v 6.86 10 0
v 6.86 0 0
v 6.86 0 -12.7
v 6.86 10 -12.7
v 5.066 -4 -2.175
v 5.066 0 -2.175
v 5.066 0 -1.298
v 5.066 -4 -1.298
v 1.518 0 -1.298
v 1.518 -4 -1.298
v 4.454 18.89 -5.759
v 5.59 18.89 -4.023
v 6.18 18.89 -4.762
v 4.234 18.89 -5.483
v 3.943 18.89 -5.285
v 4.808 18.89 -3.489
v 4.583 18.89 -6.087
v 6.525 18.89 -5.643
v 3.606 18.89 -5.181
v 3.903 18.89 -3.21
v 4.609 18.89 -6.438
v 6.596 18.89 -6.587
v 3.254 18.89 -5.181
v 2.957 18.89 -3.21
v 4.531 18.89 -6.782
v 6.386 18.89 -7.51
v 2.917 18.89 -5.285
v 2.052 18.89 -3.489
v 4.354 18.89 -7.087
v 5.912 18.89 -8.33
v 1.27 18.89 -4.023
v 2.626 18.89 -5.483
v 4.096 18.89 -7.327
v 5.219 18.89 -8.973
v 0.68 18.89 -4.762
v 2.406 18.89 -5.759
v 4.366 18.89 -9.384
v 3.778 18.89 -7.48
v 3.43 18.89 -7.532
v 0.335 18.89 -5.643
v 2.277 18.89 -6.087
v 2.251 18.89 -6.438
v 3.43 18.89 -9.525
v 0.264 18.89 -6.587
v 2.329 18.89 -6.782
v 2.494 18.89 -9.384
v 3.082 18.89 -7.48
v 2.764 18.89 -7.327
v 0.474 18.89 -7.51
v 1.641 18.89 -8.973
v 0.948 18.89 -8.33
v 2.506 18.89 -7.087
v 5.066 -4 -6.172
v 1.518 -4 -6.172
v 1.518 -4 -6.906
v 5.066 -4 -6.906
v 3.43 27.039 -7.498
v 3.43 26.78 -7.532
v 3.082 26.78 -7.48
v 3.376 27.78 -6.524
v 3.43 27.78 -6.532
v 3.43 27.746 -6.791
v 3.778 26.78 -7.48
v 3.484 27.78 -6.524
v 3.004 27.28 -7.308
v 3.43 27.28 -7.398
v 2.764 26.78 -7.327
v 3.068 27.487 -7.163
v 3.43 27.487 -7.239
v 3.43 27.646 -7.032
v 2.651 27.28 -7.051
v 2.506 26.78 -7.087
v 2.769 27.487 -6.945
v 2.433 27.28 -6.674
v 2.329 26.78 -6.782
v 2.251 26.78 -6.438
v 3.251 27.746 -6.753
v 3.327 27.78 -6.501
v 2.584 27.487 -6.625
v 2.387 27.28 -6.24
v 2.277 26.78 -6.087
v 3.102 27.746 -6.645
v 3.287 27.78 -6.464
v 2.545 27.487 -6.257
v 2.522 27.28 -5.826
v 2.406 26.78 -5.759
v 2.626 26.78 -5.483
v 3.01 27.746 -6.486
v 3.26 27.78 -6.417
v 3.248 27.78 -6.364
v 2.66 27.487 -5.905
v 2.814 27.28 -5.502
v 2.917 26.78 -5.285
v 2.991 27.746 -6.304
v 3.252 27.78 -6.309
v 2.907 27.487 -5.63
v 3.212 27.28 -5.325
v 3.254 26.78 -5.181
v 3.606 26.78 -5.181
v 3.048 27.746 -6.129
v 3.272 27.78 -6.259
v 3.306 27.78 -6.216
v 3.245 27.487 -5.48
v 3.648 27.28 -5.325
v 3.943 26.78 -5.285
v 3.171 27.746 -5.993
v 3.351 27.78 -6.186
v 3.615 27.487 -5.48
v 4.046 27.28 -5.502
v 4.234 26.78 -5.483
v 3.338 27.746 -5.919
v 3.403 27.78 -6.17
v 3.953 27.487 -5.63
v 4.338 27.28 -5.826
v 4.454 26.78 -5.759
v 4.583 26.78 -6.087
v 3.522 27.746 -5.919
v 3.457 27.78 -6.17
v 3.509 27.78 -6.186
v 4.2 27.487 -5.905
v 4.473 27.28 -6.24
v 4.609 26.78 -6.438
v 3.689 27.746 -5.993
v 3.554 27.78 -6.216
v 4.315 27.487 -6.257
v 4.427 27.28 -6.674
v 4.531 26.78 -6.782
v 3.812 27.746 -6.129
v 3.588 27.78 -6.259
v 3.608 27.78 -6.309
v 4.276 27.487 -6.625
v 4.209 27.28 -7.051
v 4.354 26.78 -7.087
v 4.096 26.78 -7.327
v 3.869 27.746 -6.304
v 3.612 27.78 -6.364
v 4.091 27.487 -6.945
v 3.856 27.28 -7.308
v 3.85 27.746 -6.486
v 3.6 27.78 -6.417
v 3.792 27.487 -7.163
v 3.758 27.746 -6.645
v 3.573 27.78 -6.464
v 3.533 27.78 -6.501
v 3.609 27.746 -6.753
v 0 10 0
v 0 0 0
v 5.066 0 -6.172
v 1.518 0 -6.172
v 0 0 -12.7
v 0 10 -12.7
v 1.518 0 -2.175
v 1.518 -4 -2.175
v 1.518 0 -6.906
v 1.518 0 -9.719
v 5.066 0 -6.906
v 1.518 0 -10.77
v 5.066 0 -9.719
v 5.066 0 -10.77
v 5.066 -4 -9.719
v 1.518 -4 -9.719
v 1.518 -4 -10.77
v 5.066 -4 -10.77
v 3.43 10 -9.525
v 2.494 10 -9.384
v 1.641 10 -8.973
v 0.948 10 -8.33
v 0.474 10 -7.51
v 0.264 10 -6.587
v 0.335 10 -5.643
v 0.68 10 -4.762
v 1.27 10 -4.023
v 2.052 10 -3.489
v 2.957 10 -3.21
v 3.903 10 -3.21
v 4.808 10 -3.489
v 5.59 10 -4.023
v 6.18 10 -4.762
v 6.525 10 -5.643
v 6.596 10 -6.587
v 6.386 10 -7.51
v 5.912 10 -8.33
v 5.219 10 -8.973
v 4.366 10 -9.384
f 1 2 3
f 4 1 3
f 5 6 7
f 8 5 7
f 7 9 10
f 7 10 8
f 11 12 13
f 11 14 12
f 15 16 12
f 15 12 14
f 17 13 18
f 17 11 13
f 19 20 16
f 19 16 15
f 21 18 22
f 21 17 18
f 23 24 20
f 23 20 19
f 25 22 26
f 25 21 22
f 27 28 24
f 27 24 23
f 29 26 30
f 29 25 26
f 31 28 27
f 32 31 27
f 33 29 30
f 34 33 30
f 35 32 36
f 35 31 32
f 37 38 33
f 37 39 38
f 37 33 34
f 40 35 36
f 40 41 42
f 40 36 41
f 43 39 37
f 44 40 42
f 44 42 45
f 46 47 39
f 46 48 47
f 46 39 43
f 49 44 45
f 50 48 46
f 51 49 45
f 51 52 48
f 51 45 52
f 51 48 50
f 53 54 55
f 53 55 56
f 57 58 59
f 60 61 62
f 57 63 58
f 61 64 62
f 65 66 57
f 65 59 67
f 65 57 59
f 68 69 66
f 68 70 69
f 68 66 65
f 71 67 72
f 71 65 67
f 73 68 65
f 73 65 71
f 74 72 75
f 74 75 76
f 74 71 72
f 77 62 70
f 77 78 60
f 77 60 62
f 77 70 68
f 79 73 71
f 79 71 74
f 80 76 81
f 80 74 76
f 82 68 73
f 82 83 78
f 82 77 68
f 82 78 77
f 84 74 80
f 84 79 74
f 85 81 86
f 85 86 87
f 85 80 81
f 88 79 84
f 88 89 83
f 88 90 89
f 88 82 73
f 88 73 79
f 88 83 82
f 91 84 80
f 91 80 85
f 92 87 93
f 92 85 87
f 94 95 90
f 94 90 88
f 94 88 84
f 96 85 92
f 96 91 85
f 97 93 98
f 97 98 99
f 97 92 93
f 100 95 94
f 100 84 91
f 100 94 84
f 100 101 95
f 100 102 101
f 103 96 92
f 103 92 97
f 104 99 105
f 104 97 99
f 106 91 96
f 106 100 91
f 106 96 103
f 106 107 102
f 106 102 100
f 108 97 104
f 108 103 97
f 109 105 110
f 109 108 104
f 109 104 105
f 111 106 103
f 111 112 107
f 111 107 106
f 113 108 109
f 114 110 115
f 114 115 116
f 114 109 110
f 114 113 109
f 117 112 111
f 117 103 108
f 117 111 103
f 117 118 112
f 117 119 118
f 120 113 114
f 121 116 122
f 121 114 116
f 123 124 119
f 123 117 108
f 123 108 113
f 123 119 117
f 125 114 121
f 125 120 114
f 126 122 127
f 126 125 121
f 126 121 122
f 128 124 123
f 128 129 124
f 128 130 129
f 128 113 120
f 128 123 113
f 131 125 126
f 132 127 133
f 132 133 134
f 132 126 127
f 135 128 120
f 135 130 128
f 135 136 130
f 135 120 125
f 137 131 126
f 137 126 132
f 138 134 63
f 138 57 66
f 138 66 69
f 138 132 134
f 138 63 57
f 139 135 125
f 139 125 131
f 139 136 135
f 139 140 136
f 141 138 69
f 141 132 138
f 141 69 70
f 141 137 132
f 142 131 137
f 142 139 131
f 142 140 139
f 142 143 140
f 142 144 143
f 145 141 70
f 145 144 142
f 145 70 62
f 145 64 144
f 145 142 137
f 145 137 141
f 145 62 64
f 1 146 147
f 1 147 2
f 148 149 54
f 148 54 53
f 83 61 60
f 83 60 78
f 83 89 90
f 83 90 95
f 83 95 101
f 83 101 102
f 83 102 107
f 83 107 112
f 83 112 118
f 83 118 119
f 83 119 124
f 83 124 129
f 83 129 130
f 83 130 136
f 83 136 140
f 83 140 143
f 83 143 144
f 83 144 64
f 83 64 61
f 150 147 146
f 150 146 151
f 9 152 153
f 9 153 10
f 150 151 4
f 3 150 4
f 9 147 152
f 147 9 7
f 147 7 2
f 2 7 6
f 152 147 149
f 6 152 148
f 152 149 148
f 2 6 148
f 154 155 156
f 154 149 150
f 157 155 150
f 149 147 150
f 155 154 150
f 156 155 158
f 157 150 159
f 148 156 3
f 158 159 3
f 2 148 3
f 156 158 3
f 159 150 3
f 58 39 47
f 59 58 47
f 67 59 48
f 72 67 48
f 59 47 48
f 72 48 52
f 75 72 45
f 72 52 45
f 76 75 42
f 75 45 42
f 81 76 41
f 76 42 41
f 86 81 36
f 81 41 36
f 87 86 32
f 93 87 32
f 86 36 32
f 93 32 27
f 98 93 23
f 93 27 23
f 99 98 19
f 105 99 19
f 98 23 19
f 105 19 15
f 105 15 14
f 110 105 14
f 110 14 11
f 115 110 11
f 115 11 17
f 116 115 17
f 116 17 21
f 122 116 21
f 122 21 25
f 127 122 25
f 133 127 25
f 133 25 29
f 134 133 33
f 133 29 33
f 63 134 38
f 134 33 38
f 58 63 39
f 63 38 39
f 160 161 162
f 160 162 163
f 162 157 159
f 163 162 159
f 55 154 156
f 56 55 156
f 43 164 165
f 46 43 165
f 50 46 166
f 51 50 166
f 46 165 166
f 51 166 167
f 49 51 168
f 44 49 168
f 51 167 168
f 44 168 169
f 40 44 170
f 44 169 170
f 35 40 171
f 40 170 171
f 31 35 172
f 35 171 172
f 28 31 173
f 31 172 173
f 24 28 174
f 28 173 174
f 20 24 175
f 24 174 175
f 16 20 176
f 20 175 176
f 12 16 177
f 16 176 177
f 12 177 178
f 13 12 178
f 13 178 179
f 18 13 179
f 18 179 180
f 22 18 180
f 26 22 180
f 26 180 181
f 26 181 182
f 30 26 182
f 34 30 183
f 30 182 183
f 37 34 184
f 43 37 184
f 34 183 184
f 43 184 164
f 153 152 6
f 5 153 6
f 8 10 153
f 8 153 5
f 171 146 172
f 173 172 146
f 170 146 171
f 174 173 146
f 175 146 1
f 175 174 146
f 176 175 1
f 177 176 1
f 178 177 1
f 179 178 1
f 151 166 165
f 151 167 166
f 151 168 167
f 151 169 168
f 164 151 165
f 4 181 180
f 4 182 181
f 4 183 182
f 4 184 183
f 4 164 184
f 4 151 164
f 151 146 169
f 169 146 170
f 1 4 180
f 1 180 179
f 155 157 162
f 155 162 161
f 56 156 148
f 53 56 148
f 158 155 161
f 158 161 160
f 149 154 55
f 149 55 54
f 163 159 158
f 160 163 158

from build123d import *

# Parameters (mm, degrees)
SKETCH1_W           = 6.86
SKETCH1_H           = 12.7
BOSS_EXTRUDE1_DEPTH = 10
SKETCH2_W           = 3.547875369
SKETCH2_H           = 0.73404318
SKETCH2_H_2         = 0.876773798
SKETCH2_H_3         = 1.050089549
BOSS_EXTRUDE2_DEPTH = 4
SKETCH3_R           = 3.175
BOSS_EXTRUDE3_DEPTH = 8.89
SKETCH4_R           = 1.182295496
BOSS_EXTRUDE4_DEPTH = 8.89
FILLET1_R           = 1


with BuildPart() as part:
    # Sketch1 → Boss-Extrude1 (new body)
    with BuildSketch(Plane(origin=(0, 0, 0), x_dir=(1, 0, 0), z_dir=(0, 1, 0))):
        with Locations((3.43, 6.35)):
            Rectangle(SKETCH1_W, SKETCH1_H)
    extrude(amount=BOSS_EXTRUDE1_DEPTH)

    # Sketch2 → Boss-Extrude2 (add)
    with BuildSketch(Plane.XZ):
        with Locations((3.292366904, -6.538608317)):
            Rectangle(SKETCH2_W, SKETCH2_H)
        with Locations((3.292366904, -1.736742516)):
            Rectangle(SKETCH2_W, SKETCH2_H_2)
        with Locations((3.292366904, -10.244506871)):
            Rectangle(SKETCH2_W, SKETCH2_H_3)
    extrude(amount=BOSS_EXTRUDE2_DEPTH)

    # Sketch3 → Boss-Extrude3 (add)
    with BuildSketch(Plane(origin=(0, 10, 0), x_dir=(1, 0, 0), z_dir=(0, 1, 0))):
        with Locations(Location((3.43, 6.35, 0), (0, 0, 90))):
            Circle(SKETCH3_R)
    extrude(amount=BOSS_EXTRUDE3_DEPTH)

    # Sketch4 → Boss-Extrude4 (add)
    with BuildSketch(Plane(origin=(0, 18.89, 0), x_dir=(1, 0, 0), z_dir=(0, 1, 0))):
        with Locations(Location((3.43, 6.35, 0), (0, 0, 90))):
            Circle(SKETCH4_R)
    extrude(amount=BOSS_EXTRUDE4_DEPTH)

    # Fillet1
    fillet1_edges = [part.edges().sort_by_distance(p)[0] for p in [
        (3.43, 27.78, -5.167704504),
    ]]
    fillet(fillet1_edges, radius=FILLET1_R)


solid = part.part
